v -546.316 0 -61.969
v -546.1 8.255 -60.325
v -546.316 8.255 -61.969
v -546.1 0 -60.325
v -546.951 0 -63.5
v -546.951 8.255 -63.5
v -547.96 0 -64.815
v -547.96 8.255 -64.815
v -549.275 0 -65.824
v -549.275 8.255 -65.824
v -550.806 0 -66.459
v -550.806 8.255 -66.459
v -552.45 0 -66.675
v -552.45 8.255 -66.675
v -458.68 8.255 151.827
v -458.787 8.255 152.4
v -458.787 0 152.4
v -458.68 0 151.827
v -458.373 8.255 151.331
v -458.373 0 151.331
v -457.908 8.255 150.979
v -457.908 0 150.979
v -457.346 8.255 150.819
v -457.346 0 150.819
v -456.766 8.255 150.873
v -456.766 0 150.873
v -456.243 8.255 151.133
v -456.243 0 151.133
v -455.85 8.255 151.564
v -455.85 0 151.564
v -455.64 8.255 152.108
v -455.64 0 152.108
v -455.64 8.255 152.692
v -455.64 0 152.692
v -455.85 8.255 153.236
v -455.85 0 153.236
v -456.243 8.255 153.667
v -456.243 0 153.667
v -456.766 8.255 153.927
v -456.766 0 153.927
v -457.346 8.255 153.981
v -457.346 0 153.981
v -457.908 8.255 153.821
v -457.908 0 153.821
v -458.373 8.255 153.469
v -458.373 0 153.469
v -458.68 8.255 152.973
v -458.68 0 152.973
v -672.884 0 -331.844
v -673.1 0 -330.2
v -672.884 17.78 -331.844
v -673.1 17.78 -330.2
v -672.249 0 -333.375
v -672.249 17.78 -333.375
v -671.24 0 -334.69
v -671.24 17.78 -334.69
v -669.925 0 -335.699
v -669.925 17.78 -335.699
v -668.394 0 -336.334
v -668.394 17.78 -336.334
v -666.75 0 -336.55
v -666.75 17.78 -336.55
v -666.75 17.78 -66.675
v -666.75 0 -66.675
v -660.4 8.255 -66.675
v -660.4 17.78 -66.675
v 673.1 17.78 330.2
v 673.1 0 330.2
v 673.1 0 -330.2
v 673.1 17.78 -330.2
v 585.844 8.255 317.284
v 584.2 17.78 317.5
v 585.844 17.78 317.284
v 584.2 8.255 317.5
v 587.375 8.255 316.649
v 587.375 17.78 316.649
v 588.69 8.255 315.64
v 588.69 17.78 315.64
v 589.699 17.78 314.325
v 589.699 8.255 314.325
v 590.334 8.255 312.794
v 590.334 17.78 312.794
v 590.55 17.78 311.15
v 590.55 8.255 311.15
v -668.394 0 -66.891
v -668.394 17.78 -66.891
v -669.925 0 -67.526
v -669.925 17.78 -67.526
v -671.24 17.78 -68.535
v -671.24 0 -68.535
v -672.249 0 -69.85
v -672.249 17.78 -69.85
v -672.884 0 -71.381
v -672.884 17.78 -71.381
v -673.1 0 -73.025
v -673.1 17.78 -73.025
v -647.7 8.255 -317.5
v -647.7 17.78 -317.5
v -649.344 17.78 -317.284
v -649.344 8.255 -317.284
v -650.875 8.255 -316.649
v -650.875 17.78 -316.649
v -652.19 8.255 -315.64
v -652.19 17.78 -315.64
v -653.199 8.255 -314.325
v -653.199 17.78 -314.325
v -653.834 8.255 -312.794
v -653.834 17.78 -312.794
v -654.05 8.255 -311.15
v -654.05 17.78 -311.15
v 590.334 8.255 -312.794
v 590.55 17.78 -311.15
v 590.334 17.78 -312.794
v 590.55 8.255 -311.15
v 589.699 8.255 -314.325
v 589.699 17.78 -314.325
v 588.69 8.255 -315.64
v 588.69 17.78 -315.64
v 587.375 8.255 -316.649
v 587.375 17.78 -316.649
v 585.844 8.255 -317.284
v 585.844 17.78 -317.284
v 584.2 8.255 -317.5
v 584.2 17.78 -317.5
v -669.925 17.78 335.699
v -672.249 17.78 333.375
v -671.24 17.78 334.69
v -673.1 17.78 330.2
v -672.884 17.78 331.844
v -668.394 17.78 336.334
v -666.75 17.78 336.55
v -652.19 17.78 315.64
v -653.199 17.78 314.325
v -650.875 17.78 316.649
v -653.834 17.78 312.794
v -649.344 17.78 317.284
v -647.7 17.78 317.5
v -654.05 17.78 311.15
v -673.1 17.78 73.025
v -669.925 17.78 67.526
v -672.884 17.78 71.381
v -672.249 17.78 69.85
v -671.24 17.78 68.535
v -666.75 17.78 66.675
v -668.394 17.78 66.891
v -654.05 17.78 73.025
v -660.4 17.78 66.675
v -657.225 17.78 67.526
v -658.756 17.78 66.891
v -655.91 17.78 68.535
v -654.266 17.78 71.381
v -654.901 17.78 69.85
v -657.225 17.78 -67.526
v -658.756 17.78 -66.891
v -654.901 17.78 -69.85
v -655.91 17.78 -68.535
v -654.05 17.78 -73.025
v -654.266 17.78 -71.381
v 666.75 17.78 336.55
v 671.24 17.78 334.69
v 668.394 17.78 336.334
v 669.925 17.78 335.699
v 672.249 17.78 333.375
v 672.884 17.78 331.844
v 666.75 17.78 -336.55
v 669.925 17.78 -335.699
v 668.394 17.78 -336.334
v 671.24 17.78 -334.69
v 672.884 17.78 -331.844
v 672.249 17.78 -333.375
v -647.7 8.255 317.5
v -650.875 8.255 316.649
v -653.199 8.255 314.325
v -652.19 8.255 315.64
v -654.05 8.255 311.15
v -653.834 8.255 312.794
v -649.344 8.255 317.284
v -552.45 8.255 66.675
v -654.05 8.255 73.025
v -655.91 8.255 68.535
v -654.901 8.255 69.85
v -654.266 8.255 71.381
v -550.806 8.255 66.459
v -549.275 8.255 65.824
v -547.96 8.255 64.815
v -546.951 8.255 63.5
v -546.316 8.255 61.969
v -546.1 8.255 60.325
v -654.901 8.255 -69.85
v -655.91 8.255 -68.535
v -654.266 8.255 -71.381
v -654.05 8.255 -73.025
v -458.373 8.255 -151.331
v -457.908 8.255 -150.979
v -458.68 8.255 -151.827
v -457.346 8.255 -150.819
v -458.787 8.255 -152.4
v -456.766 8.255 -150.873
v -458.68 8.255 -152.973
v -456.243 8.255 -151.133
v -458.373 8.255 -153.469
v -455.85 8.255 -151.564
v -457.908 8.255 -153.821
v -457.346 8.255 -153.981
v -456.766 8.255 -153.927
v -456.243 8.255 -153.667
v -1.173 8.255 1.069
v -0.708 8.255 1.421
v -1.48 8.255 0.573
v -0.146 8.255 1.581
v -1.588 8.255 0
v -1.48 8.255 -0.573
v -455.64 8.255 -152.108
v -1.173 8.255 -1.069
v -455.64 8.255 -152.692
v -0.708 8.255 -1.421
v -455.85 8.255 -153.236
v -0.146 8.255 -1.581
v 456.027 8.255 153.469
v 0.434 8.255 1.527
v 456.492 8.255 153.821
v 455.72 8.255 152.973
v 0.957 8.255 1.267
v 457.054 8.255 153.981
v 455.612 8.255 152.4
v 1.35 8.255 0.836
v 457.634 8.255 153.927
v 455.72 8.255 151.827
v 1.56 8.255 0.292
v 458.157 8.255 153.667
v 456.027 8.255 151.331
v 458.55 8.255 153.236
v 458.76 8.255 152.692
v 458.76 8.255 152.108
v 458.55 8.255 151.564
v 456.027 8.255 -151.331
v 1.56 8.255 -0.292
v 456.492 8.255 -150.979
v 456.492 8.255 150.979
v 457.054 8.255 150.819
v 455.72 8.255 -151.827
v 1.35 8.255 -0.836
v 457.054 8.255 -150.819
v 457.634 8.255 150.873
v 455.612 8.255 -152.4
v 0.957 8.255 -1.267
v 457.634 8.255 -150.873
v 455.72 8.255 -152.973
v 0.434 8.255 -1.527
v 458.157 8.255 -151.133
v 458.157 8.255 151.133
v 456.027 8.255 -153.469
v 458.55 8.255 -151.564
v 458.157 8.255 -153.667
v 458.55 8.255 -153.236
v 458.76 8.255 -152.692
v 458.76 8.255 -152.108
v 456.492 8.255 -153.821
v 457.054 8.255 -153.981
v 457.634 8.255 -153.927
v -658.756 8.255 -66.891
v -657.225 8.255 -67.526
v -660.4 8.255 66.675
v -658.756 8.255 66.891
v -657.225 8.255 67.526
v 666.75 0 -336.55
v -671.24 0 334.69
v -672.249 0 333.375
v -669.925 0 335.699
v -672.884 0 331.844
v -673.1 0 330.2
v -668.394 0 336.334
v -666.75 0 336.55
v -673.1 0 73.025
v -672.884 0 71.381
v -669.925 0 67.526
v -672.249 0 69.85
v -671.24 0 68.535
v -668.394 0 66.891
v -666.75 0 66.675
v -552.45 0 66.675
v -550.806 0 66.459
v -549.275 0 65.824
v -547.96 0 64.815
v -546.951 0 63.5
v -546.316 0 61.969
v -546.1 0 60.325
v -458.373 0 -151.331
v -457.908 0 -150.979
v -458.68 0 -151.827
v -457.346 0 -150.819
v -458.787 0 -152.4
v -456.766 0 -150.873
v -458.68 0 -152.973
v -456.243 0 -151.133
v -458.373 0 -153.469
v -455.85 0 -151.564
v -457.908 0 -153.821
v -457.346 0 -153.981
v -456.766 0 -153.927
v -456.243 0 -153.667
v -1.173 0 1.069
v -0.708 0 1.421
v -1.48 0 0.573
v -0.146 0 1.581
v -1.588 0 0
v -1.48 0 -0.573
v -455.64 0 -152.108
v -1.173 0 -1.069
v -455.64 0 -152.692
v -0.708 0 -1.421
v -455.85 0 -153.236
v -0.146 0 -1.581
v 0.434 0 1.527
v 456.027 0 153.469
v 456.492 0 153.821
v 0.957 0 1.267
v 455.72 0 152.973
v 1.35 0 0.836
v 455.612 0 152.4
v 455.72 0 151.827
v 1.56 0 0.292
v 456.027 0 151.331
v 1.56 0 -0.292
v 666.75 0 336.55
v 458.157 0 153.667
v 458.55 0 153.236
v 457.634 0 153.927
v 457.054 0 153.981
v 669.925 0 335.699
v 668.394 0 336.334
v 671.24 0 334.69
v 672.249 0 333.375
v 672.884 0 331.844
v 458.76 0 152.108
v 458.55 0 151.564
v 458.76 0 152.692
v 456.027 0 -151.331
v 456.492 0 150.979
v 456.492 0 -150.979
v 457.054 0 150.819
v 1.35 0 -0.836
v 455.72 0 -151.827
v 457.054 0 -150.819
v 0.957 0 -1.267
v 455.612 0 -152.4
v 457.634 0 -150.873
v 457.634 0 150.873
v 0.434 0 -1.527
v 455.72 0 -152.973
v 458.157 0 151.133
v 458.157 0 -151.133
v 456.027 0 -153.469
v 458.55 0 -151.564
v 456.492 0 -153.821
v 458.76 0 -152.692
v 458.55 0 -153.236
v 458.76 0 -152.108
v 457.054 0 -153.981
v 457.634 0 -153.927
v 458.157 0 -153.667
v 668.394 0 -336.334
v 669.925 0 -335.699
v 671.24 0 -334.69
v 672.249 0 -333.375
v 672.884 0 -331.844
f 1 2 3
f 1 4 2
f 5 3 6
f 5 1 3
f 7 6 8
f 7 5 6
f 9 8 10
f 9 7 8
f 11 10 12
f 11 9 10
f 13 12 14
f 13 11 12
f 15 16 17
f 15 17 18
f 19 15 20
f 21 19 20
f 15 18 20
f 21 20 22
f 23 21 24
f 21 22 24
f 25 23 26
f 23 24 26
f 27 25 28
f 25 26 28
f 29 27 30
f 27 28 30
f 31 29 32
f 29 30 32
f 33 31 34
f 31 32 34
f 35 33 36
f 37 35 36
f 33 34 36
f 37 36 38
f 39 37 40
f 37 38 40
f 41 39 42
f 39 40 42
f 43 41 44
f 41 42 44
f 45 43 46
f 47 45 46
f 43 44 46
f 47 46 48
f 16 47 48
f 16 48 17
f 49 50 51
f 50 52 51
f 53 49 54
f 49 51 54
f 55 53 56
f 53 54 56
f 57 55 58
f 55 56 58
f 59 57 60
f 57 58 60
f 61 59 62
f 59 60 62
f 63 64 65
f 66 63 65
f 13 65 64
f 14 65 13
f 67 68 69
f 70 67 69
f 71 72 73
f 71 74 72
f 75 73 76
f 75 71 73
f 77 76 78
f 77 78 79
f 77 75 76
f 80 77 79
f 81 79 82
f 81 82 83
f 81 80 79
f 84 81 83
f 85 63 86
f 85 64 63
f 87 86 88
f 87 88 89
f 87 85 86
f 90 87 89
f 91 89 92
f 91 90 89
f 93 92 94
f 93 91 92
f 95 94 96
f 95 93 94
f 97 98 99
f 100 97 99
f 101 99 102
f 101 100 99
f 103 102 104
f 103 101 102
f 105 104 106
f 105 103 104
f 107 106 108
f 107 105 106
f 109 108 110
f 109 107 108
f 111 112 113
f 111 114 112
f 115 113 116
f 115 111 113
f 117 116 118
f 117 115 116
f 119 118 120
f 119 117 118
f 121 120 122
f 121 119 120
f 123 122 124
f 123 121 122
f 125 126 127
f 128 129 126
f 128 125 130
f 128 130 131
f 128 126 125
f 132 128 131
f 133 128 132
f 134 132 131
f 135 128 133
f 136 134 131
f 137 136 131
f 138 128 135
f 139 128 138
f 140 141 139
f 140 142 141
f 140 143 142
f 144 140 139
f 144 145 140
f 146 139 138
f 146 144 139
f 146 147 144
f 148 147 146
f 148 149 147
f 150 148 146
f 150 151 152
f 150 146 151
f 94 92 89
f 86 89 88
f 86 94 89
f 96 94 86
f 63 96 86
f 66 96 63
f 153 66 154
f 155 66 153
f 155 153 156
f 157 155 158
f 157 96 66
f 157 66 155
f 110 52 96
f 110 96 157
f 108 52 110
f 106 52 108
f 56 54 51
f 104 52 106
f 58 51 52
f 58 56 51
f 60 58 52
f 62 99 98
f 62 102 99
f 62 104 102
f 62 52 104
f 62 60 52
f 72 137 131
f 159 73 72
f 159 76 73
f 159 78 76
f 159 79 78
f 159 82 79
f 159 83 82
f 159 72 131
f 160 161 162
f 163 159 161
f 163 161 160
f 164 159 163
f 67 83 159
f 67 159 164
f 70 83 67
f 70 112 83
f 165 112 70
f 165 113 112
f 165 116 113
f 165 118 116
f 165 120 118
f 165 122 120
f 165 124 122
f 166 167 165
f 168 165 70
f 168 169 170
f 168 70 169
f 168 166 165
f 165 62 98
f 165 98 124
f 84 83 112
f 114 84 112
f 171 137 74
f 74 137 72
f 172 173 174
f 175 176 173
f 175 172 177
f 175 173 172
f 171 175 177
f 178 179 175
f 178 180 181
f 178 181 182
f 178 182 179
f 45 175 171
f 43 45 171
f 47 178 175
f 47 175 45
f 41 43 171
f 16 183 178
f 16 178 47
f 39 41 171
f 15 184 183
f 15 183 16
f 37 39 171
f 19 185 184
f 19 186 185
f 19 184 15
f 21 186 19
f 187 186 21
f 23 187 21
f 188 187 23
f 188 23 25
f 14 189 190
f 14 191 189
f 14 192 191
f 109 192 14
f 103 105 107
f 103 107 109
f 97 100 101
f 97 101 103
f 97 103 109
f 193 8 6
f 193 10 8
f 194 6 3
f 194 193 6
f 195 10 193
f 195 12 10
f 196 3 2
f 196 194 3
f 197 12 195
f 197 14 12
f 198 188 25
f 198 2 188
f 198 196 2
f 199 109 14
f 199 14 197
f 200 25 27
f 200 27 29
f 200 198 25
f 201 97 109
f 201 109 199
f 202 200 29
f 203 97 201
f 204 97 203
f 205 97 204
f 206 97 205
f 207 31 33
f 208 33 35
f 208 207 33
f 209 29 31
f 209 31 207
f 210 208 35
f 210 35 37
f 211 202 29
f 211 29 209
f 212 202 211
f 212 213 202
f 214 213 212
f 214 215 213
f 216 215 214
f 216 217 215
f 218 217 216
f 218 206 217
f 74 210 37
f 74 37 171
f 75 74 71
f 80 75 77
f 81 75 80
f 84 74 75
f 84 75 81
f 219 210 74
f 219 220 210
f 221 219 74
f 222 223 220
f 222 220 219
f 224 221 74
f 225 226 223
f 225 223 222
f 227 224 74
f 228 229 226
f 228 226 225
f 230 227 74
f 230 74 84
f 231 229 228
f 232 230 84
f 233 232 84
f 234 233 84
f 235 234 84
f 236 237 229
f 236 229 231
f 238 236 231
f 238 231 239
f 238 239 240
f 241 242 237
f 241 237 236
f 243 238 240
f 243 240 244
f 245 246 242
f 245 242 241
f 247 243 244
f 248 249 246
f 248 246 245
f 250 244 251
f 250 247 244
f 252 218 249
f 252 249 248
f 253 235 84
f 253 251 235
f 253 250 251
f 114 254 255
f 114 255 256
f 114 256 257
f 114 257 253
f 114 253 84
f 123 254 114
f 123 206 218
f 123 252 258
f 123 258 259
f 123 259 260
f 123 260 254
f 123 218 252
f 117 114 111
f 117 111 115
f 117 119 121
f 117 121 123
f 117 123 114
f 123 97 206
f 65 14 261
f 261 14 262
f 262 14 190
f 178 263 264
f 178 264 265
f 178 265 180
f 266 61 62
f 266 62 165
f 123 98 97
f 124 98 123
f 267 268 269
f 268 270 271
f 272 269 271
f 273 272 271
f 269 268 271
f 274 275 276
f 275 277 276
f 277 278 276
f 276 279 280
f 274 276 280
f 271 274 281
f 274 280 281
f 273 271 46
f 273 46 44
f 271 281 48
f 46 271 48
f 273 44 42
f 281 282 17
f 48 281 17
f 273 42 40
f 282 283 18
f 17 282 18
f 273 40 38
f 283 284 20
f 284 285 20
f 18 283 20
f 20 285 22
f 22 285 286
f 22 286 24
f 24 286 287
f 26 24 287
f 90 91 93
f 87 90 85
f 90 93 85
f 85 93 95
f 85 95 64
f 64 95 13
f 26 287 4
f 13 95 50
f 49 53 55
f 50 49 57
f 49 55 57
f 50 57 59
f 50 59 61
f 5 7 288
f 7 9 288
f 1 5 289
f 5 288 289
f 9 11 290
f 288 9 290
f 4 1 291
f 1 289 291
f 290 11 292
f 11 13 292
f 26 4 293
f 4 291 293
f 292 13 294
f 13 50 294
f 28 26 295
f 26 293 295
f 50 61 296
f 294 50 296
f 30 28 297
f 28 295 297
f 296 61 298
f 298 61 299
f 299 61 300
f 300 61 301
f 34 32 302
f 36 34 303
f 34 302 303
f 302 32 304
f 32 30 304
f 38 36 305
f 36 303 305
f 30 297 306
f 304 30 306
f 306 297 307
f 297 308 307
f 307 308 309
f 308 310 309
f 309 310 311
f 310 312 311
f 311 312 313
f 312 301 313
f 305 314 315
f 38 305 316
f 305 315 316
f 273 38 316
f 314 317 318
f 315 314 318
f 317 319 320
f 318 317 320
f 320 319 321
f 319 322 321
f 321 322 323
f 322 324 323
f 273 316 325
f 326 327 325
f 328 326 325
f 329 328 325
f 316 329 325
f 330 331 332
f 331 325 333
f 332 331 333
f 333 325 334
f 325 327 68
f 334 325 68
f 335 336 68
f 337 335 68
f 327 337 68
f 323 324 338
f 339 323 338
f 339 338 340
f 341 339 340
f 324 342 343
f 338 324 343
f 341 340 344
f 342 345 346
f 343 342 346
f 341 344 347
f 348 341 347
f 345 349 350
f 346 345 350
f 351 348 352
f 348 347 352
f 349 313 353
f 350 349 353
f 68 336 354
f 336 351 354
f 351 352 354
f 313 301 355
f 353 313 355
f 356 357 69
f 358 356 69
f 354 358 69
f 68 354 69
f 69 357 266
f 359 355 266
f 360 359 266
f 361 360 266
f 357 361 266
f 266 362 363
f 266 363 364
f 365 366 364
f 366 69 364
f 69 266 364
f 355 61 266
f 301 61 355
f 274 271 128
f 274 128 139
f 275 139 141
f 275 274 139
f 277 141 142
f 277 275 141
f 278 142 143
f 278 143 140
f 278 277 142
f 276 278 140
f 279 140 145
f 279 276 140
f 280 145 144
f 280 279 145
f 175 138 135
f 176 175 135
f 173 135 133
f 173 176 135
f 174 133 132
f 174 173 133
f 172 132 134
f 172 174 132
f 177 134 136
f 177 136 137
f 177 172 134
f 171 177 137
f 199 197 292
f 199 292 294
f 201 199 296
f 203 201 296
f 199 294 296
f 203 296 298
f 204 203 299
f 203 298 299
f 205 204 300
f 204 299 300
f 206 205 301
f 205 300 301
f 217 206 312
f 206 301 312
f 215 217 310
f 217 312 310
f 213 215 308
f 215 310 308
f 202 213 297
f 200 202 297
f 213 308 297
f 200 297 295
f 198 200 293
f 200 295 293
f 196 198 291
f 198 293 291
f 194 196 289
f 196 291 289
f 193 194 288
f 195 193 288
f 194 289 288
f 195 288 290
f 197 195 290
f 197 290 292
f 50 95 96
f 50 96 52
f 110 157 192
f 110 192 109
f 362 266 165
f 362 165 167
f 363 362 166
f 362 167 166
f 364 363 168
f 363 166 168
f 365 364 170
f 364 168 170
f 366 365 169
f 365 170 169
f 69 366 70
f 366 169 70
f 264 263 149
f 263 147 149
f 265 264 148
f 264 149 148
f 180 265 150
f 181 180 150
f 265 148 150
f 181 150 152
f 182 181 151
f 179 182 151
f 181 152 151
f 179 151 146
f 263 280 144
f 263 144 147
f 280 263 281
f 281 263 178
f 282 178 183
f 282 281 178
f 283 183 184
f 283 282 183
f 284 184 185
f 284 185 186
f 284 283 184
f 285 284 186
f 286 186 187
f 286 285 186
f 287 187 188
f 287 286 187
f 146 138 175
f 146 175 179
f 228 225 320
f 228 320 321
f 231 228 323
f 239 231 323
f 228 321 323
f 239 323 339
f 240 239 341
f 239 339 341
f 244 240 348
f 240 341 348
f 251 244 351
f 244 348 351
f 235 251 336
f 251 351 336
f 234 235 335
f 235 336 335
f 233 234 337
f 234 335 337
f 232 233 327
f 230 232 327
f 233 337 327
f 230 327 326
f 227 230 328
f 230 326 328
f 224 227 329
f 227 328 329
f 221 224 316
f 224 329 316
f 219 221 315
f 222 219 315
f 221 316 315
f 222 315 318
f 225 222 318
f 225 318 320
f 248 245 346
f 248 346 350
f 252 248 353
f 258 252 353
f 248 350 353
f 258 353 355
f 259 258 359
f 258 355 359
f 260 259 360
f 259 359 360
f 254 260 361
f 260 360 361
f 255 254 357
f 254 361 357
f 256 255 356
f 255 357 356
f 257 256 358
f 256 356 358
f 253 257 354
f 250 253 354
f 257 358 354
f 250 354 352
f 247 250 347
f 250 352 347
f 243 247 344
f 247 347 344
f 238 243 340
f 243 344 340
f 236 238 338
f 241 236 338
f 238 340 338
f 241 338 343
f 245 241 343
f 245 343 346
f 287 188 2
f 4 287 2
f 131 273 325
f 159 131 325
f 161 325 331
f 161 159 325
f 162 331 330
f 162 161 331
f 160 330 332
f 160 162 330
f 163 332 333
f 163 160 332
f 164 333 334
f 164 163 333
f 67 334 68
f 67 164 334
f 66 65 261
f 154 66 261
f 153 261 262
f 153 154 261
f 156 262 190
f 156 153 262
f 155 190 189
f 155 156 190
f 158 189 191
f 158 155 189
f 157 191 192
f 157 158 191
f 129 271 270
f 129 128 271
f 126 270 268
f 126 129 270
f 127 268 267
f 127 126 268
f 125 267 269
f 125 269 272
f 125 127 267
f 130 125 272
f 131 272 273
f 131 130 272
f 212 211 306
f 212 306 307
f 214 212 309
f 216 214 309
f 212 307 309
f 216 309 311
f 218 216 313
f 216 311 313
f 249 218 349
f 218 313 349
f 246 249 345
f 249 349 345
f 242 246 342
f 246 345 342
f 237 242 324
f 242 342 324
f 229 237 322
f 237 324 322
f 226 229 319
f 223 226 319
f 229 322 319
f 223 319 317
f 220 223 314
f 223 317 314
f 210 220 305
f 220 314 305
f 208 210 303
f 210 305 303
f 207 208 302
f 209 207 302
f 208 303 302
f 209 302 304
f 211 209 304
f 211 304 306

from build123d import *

# Parameters (mm, degrees)
SKETCH1_W                    = 1346.2
SKETCH1_H                    = 673.1
BOSS_EXTRUDE1_DEPTH          = 17.78
F_1_8_0_125_DIAMETER_HOLE1_D = 3.175
SKETCH4_W                    = 127
SKETCH4_H                    = 133.35
CUT_EXTRUDE1_DEPTH           = 753.758687031
SKETCH5_W                    = 1244.6
SKETCH5_H                    = 635
CUT_EXTRUDE2_DEPTH           = 9.525
FILLET1_R                    = 6.35


with BuildPart() as part:
    # Sketch1 → Boss-Extrude1 (new body)
    with BuildSketch(Plane(origin=(0, 0, 0), x_dir=(1, 0, 0), z_dir=(0, 1, 0))):
        Rectangle(SKETCH1_W, SKETCH1_H)
    extrude(amount=BOSS_EXTRUDE1_DEPTH)

    # 1/8 (0.125) Diameter Hole1 (through all)
    with Locations(Plane(origin=(0, 17.78, 0), x_dir=(1, 0, 0), z_dir=(0, 1, 0))):
        with Locations((0, 0), (457.2, 152.4), (-457.2, -152.4), (-457.2, 152.4), (457.2, -152.4)):
            Hole(F_1_8_0_125_DIAMETER_HOLE1_D / 2)

    # Sketch4 → Cut-Extrude1 (cut, through all)
    with BuildSketch(Plane(origin=(0, 17.78, 0), x_dir=(1, 0, 0), z_dir=(0, 1, 0))):
        with Locations((-609.6, 0)):
            Rectangle(SKETCH4_W, SKETCH4_H)
    extrude(amount=-CUT_EXTRUDE1_DEPTH, mode=Mode.SUBTRACT)

    # Sketch5 → Cut-Extrude2 (cut)
    with BuildSketch(Plane(origin=(0, 17.78, 0), x_dir=(1, 0, 0), z_dir=(0, 1, 0))):
        with Locations((-31.75, 0)):
            Rectangle(SKETCH5_W, SKETCH5_H)
    extrude(amount=-CUT_EXTRUDE2_DEPTH, mode=Mode.SUBTRACT)

    # Fillet1
    fillet1_edges = [part.edges().sort_by_distance(p)[0] for p in [
        (-673.1, 8.89, 66.675),
        (-673.1, 8.89, -66.675),
        (-546.1, 4.1275, -66.675),
        (-546.1, 4.1275, 66.675),
        (-654.05, 13.0175, 66.675),
        (-654.05, 13.0175, -66.675),
        (-654.05, 13.0175, 317.5),
        (590.55, 13.0175, -317.5),
        (673.1, 8.89, 336.55),
        (590.55, 13.0175, 317.5),
        (-673.1, 8.89, 336.55),
        (-654.05, 13.0175, -317.5),
        (-673.1, 8.89, -336.55),
        (673.1, 8.89, -336.55),
    ]]
    fillet(fillet1_edges, radius=FILLET1_R)


solid = part.part
